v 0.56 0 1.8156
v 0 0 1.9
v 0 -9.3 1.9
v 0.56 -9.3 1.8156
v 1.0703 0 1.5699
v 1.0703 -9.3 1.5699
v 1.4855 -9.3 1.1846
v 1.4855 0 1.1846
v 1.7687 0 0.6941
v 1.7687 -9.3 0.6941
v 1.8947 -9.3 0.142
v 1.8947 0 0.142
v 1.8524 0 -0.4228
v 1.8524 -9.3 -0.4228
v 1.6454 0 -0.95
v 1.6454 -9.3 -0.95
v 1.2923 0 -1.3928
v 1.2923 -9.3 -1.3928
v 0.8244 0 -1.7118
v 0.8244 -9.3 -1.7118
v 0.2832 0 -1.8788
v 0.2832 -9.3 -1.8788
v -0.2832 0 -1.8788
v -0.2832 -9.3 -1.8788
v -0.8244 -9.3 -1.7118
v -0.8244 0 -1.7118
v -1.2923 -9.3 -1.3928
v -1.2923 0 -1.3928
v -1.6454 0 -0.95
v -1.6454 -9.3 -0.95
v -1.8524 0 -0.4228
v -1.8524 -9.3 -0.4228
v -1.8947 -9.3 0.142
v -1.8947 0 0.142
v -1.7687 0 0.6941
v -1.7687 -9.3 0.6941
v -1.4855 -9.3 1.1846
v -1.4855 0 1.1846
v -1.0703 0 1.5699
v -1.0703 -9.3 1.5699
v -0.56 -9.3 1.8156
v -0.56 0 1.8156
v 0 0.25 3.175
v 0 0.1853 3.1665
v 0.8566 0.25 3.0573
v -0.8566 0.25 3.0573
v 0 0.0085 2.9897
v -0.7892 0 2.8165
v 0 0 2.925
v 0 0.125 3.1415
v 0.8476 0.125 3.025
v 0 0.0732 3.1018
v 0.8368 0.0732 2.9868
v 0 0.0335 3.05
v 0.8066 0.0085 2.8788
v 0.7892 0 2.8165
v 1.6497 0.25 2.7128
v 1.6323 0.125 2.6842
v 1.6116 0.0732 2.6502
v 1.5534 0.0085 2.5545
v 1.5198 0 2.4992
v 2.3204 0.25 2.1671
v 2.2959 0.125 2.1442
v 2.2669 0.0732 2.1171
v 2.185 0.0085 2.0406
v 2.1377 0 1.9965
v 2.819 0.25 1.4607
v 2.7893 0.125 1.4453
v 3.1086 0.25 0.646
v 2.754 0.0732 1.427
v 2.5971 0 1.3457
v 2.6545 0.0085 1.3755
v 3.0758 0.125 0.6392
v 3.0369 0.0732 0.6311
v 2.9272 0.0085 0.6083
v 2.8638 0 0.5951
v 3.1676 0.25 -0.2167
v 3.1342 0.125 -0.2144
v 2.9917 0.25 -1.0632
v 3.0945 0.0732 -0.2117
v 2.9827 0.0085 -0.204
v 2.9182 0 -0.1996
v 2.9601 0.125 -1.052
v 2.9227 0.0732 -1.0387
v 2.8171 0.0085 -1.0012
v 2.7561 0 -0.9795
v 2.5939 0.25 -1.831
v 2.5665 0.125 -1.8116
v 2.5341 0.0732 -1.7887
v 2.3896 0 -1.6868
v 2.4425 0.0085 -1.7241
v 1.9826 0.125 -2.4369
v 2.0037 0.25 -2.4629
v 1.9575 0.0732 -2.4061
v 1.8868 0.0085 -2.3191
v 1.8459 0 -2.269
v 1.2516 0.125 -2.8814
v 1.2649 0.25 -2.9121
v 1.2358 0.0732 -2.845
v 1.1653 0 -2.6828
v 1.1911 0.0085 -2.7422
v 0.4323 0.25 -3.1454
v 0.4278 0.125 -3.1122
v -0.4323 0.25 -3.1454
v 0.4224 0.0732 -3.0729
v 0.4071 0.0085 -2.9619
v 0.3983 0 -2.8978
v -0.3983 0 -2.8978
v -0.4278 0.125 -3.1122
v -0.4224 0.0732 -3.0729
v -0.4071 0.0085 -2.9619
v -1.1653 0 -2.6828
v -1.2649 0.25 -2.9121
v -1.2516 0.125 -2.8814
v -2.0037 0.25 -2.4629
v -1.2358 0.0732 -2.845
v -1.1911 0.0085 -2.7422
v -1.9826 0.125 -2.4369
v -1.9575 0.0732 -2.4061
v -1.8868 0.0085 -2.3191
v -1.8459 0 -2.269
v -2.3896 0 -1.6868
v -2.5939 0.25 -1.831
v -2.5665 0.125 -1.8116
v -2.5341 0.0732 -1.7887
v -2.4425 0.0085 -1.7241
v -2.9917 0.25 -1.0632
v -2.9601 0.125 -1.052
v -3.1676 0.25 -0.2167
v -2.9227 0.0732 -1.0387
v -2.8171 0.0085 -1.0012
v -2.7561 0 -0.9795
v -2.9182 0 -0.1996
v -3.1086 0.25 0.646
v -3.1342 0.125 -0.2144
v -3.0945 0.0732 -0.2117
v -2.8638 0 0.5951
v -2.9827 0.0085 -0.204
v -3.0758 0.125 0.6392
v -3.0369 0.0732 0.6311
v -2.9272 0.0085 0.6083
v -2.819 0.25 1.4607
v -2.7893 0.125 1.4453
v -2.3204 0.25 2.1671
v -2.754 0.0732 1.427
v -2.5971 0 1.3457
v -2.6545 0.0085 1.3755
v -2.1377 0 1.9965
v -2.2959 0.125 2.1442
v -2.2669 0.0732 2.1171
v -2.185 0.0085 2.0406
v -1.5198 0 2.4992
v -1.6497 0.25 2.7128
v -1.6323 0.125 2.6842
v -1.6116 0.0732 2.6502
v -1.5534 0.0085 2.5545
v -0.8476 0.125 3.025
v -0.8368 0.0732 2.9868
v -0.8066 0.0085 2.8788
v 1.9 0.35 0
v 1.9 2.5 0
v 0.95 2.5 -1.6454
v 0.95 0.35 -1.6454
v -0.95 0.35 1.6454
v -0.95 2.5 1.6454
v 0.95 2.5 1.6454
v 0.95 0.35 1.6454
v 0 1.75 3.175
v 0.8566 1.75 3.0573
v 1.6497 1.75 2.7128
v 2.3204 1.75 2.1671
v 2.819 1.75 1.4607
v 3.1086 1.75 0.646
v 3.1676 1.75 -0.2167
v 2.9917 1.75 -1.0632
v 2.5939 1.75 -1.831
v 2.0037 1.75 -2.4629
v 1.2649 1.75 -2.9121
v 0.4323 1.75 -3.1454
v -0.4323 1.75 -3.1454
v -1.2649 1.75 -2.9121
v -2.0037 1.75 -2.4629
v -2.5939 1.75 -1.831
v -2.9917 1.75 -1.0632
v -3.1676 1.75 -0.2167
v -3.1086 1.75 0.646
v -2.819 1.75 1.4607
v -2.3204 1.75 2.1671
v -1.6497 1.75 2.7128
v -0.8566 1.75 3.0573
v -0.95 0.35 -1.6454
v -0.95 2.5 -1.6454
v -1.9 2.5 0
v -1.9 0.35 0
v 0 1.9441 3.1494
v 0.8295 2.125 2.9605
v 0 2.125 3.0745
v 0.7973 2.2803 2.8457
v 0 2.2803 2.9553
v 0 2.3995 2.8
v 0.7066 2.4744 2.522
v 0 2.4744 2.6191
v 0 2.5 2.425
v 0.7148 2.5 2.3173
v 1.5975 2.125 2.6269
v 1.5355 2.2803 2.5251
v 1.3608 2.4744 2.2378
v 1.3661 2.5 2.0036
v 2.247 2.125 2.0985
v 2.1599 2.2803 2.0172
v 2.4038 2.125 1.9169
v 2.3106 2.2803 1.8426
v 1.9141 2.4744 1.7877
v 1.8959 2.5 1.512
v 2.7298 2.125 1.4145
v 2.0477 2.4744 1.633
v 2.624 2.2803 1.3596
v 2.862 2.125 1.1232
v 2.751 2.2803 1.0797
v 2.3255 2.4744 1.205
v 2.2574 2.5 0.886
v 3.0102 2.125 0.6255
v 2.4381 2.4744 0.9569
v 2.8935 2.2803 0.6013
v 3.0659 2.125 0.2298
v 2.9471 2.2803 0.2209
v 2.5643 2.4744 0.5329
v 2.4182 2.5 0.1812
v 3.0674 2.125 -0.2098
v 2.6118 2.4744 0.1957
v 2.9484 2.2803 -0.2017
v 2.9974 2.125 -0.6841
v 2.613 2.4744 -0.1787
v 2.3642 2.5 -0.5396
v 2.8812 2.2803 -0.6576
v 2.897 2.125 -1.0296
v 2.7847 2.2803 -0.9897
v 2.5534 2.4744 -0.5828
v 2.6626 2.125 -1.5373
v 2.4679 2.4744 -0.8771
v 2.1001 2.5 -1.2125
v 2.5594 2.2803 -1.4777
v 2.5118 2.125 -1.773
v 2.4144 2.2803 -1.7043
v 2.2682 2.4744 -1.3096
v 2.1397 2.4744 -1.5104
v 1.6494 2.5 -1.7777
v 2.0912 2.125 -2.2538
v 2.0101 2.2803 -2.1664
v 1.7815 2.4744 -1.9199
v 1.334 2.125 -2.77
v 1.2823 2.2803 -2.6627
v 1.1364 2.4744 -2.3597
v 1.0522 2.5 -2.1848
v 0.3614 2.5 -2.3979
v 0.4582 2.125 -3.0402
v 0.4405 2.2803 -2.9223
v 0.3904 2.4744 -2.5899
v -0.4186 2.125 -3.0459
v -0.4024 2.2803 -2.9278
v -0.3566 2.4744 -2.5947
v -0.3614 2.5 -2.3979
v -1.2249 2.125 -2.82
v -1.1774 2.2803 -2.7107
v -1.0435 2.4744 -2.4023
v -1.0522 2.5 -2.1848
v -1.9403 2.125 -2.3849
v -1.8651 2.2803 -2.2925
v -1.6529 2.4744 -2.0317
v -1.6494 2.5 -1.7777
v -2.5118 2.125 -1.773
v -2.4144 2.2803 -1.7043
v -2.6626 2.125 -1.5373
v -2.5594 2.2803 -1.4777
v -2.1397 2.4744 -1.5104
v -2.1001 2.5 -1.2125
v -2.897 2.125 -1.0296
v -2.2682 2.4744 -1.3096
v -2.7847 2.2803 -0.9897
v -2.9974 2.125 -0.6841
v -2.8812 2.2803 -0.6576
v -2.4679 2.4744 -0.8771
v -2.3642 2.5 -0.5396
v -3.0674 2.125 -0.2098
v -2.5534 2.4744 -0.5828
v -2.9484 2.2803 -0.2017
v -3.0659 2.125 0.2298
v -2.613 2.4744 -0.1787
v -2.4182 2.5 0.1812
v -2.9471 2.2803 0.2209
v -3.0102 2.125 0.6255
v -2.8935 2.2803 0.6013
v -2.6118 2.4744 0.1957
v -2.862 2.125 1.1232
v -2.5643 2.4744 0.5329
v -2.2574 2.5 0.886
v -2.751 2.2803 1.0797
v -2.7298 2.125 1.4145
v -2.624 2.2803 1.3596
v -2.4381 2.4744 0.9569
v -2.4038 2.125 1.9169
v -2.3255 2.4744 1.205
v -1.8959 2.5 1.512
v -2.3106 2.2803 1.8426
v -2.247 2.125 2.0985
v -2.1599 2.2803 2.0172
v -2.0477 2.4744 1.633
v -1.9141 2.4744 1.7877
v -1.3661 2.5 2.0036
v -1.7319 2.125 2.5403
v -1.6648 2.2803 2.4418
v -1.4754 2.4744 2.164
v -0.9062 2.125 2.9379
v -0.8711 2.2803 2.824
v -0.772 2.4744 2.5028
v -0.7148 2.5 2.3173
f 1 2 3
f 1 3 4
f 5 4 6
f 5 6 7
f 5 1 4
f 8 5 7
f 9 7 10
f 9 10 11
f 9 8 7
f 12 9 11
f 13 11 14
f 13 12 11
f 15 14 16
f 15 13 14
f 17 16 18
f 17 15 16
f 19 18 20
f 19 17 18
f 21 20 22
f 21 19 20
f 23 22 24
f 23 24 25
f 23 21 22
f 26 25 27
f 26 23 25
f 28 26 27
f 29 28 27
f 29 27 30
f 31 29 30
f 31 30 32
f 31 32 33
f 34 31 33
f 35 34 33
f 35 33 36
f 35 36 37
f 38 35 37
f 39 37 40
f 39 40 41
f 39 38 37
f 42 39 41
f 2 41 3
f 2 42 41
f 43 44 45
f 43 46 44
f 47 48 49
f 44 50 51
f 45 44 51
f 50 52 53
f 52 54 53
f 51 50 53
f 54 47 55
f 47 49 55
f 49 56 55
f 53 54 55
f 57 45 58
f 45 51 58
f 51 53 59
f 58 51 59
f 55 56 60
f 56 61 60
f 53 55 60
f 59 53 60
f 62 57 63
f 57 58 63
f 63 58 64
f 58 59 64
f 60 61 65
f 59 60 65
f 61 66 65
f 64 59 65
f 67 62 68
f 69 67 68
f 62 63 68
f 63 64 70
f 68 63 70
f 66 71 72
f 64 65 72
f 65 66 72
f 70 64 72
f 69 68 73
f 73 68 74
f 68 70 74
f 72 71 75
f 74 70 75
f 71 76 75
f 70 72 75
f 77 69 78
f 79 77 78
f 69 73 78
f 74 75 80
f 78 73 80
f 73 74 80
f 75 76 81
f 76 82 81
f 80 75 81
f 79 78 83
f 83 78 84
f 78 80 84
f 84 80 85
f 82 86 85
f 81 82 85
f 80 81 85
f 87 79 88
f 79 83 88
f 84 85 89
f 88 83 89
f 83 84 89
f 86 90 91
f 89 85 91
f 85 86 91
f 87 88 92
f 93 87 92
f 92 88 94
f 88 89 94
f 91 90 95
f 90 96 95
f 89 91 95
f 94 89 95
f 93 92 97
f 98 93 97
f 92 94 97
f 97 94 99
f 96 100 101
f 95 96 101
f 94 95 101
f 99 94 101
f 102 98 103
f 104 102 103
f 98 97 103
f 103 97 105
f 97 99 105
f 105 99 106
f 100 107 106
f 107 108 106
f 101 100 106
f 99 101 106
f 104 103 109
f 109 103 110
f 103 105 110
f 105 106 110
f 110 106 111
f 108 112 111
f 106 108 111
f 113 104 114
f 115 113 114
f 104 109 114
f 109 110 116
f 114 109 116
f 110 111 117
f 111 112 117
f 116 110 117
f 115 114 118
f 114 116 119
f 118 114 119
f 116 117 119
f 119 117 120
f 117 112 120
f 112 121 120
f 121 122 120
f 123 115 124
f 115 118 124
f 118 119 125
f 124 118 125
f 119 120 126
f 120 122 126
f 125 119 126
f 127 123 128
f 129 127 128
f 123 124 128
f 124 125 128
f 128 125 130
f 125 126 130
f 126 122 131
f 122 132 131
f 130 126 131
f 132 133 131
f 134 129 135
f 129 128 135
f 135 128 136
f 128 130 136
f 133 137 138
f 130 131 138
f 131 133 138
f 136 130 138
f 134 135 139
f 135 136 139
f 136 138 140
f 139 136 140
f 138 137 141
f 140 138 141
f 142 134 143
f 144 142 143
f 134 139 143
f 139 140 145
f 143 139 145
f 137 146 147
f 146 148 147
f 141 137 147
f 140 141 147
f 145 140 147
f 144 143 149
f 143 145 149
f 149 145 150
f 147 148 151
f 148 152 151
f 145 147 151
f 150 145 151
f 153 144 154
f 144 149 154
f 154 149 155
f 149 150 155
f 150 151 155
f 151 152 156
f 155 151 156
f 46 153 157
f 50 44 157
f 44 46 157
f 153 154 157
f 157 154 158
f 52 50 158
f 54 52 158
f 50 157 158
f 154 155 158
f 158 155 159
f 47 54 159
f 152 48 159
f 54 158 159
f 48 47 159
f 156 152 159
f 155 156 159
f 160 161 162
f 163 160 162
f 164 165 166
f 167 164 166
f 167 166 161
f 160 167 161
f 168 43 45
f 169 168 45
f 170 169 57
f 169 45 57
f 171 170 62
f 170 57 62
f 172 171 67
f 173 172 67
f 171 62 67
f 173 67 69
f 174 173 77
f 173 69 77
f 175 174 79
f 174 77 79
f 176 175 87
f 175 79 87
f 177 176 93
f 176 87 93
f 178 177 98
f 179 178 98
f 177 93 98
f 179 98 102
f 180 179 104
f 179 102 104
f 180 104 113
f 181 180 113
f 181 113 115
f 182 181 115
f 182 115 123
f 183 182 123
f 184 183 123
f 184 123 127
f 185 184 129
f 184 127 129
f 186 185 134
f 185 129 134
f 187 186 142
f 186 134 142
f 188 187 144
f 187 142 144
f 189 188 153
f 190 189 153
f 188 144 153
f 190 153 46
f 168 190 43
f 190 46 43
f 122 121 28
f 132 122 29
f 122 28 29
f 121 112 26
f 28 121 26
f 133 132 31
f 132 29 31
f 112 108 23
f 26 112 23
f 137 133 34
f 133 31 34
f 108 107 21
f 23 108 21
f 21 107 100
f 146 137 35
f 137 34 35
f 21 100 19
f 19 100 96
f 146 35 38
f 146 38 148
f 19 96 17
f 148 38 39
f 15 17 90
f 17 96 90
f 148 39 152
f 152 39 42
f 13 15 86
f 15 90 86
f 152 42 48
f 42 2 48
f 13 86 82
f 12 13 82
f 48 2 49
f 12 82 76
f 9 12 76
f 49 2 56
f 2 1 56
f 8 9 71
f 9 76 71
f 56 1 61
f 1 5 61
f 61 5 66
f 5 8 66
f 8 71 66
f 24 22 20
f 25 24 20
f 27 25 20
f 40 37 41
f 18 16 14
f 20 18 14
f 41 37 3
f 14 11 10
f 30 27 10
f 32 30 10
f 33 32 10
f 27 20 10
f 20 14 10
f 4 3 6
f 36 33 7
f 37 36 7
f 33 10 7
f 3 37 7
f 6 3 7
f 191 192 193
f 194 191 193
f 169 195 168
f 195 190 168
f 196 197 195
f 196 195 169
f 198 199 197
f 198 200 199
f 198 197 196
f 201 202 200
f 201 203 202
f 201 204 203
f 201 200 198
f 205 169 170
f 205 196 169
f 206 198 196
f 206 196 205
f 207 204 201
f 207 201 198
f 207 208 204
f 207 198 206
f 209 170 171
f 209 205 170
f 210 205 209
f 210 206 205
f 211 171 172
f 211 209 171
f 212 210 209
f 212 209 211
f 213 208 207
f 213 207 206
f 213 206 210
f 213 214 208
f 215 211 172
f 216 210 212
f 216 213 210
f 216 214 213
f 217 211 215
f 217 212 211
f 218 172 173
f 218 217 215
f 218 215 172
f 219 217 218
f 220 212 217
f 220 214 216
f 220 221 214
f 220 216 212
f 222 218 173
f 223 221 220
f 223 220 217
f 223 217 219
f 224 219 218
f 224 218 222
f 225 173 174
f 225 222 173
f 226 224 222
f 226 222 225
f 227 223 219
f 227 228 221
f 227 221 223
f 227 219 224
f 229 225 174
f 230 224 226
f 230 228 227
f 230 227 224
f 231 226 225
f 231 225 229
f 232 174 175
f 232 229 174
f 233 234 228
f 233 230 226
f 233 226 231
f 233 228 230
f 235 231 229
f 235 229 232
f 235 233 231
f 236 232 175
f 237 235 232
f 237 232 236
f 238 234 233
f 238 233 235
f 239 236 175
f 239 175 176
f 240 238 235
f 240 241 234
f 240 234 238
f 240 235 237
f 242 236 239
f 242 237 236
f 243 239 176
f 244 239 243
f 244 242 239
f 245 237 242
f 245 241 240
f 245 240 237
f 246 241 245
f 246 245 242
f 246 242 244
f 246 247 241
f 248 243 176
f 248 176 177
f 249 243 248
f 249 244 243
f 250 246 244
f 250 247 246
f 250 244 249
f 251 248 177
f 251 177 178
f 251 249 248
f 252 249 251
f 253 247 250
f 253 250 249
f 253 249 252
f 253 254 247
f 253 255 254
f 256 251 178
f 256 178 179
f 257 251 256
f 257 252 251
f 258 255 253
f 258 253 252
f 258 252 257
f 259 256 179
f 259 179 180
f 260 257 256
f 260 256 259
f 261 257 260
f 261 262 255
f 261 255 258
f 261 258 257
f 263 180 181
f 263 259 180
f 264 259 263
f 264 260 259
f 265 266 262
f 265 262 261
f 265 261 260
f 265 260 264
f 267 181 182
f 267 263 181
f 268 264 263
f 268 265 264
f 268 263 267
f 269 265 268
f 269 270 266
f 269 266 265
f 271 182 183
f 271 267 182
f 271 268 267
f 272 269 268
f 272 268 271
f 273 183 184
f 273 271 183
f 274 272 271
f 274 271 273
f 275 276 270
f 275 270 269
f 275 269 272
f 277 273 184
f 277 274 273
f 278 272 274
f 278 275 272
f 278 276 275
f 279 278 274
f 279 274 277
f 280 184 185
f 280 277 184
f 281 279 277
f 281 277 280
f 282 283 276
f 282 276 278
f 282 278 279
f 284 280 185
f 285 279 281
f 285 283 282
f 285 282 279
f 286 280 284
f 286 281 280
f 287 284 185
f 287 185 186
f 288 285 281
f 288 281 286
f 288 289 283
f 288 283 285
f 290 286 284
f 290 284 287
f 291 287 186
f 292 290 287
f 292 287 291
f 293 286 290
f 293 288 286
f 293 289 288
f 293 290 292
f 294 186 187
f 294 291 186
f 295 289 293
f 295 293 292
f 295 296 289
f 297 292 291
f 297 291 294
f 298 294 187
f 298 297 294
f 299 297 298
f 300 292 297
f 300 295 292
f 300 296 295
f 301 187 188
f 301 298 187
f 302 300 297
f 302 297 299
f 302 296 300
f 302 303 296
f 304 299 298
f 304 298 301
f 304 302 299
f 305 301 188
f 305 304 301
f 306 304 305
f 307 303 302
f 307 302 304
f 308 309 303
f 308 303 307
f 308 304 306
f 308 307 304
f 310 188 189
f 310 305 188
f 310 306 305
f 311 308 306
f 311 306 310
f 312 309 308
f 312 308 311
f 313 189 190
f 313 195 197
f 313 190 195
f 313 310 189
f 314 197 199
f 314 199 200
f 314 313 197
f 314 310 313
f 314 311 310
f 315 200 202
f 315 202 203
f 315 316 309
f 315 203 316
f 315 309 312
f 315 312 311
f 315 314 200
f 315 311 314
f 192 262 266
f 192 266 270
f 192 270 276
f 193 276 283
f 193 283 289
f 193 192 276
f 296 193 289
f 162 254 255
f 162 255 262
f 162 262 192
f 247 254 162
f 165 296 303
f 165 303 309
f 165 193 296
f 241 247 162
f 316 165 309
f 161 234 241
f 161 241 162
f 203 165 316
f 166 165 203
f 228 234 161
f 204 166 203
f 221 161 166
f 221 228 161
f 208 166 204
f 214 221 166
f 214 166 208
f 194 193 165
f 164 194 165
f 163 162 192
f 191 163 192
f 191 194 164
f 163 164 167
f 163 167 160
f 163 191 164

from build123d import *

# Parameters (mm, degrees)
SKETCH1_R           = 3.175
BOSS_EXTRUDE3_DEPTH = 2.5
CUT_EXTRUDE3_DEPTH  = 2.15
SKETCH8_R           = 1.9
BOSS_EXTRUDE4_DEPTH = 9.3
FILLET2_R           = 0.75
FILLET3_R           = 0.25


with BuildPart() as part:
    # Sketch1 → Boss-Extrude3 (new body)
    with BuildSketch(Plane(origin=(0, 0, 0), x_dir=(1, 0, 0), z_dir=(0, 1, 0))):
        with Locations(Location((0, 0, 0), (0, 0, 270))):
            Circle(SKETCH1_R)
    extrude(amount=BOSS_EXTRUDE3_DEPTH)

    # Sketch7 → Cut-Extrude3 (cut)
    with BuildSketch(Plane(origin=(0, 2.5, 0), x_dir=(1, 0, 0), z_dir=(0, 1, 0))):
        Polygon((0.95, 1.645448267), (-0.95, 1.645448267), (-1.9, 0), (-0.95, -1.645448267), (0.95, -1.645448267), (1.9, 0), align=None)
    extrude(amount=-CUT_EXTRUDE3_DEPTH, mode=Mode.SUBTRACT)

    # Sketch8 → Boss-Extrude4 (add)
    with BuildSketch(Plane(origin=(0, 0, 0), x_dir=(1, 0, 0), z_dir=(0, 1, 0))):
        with Locations(Location((0, 0, 0), (0, 0, 270))):
            Circle(SKETCH8_R)
    extrude(amount=-BOSS_EXTRUDE4_DEPTH)

    # Fillet2
    fillet2_edges = [part.edges().sort_by_distance(p)[0] for p in [
        (0, 2.5, -3.175),
    ]]
    fillet(fillet2_edges, radius=FILLET2_R)

    # Fillet3
    fillet3_edges = [part.edges().sort_by_distance(p)[0] for p in [
        (0, 0, -3.175),
    ]]
    fillet(fillet3_edges, radius=FILLET3_R)


solid = part.part
